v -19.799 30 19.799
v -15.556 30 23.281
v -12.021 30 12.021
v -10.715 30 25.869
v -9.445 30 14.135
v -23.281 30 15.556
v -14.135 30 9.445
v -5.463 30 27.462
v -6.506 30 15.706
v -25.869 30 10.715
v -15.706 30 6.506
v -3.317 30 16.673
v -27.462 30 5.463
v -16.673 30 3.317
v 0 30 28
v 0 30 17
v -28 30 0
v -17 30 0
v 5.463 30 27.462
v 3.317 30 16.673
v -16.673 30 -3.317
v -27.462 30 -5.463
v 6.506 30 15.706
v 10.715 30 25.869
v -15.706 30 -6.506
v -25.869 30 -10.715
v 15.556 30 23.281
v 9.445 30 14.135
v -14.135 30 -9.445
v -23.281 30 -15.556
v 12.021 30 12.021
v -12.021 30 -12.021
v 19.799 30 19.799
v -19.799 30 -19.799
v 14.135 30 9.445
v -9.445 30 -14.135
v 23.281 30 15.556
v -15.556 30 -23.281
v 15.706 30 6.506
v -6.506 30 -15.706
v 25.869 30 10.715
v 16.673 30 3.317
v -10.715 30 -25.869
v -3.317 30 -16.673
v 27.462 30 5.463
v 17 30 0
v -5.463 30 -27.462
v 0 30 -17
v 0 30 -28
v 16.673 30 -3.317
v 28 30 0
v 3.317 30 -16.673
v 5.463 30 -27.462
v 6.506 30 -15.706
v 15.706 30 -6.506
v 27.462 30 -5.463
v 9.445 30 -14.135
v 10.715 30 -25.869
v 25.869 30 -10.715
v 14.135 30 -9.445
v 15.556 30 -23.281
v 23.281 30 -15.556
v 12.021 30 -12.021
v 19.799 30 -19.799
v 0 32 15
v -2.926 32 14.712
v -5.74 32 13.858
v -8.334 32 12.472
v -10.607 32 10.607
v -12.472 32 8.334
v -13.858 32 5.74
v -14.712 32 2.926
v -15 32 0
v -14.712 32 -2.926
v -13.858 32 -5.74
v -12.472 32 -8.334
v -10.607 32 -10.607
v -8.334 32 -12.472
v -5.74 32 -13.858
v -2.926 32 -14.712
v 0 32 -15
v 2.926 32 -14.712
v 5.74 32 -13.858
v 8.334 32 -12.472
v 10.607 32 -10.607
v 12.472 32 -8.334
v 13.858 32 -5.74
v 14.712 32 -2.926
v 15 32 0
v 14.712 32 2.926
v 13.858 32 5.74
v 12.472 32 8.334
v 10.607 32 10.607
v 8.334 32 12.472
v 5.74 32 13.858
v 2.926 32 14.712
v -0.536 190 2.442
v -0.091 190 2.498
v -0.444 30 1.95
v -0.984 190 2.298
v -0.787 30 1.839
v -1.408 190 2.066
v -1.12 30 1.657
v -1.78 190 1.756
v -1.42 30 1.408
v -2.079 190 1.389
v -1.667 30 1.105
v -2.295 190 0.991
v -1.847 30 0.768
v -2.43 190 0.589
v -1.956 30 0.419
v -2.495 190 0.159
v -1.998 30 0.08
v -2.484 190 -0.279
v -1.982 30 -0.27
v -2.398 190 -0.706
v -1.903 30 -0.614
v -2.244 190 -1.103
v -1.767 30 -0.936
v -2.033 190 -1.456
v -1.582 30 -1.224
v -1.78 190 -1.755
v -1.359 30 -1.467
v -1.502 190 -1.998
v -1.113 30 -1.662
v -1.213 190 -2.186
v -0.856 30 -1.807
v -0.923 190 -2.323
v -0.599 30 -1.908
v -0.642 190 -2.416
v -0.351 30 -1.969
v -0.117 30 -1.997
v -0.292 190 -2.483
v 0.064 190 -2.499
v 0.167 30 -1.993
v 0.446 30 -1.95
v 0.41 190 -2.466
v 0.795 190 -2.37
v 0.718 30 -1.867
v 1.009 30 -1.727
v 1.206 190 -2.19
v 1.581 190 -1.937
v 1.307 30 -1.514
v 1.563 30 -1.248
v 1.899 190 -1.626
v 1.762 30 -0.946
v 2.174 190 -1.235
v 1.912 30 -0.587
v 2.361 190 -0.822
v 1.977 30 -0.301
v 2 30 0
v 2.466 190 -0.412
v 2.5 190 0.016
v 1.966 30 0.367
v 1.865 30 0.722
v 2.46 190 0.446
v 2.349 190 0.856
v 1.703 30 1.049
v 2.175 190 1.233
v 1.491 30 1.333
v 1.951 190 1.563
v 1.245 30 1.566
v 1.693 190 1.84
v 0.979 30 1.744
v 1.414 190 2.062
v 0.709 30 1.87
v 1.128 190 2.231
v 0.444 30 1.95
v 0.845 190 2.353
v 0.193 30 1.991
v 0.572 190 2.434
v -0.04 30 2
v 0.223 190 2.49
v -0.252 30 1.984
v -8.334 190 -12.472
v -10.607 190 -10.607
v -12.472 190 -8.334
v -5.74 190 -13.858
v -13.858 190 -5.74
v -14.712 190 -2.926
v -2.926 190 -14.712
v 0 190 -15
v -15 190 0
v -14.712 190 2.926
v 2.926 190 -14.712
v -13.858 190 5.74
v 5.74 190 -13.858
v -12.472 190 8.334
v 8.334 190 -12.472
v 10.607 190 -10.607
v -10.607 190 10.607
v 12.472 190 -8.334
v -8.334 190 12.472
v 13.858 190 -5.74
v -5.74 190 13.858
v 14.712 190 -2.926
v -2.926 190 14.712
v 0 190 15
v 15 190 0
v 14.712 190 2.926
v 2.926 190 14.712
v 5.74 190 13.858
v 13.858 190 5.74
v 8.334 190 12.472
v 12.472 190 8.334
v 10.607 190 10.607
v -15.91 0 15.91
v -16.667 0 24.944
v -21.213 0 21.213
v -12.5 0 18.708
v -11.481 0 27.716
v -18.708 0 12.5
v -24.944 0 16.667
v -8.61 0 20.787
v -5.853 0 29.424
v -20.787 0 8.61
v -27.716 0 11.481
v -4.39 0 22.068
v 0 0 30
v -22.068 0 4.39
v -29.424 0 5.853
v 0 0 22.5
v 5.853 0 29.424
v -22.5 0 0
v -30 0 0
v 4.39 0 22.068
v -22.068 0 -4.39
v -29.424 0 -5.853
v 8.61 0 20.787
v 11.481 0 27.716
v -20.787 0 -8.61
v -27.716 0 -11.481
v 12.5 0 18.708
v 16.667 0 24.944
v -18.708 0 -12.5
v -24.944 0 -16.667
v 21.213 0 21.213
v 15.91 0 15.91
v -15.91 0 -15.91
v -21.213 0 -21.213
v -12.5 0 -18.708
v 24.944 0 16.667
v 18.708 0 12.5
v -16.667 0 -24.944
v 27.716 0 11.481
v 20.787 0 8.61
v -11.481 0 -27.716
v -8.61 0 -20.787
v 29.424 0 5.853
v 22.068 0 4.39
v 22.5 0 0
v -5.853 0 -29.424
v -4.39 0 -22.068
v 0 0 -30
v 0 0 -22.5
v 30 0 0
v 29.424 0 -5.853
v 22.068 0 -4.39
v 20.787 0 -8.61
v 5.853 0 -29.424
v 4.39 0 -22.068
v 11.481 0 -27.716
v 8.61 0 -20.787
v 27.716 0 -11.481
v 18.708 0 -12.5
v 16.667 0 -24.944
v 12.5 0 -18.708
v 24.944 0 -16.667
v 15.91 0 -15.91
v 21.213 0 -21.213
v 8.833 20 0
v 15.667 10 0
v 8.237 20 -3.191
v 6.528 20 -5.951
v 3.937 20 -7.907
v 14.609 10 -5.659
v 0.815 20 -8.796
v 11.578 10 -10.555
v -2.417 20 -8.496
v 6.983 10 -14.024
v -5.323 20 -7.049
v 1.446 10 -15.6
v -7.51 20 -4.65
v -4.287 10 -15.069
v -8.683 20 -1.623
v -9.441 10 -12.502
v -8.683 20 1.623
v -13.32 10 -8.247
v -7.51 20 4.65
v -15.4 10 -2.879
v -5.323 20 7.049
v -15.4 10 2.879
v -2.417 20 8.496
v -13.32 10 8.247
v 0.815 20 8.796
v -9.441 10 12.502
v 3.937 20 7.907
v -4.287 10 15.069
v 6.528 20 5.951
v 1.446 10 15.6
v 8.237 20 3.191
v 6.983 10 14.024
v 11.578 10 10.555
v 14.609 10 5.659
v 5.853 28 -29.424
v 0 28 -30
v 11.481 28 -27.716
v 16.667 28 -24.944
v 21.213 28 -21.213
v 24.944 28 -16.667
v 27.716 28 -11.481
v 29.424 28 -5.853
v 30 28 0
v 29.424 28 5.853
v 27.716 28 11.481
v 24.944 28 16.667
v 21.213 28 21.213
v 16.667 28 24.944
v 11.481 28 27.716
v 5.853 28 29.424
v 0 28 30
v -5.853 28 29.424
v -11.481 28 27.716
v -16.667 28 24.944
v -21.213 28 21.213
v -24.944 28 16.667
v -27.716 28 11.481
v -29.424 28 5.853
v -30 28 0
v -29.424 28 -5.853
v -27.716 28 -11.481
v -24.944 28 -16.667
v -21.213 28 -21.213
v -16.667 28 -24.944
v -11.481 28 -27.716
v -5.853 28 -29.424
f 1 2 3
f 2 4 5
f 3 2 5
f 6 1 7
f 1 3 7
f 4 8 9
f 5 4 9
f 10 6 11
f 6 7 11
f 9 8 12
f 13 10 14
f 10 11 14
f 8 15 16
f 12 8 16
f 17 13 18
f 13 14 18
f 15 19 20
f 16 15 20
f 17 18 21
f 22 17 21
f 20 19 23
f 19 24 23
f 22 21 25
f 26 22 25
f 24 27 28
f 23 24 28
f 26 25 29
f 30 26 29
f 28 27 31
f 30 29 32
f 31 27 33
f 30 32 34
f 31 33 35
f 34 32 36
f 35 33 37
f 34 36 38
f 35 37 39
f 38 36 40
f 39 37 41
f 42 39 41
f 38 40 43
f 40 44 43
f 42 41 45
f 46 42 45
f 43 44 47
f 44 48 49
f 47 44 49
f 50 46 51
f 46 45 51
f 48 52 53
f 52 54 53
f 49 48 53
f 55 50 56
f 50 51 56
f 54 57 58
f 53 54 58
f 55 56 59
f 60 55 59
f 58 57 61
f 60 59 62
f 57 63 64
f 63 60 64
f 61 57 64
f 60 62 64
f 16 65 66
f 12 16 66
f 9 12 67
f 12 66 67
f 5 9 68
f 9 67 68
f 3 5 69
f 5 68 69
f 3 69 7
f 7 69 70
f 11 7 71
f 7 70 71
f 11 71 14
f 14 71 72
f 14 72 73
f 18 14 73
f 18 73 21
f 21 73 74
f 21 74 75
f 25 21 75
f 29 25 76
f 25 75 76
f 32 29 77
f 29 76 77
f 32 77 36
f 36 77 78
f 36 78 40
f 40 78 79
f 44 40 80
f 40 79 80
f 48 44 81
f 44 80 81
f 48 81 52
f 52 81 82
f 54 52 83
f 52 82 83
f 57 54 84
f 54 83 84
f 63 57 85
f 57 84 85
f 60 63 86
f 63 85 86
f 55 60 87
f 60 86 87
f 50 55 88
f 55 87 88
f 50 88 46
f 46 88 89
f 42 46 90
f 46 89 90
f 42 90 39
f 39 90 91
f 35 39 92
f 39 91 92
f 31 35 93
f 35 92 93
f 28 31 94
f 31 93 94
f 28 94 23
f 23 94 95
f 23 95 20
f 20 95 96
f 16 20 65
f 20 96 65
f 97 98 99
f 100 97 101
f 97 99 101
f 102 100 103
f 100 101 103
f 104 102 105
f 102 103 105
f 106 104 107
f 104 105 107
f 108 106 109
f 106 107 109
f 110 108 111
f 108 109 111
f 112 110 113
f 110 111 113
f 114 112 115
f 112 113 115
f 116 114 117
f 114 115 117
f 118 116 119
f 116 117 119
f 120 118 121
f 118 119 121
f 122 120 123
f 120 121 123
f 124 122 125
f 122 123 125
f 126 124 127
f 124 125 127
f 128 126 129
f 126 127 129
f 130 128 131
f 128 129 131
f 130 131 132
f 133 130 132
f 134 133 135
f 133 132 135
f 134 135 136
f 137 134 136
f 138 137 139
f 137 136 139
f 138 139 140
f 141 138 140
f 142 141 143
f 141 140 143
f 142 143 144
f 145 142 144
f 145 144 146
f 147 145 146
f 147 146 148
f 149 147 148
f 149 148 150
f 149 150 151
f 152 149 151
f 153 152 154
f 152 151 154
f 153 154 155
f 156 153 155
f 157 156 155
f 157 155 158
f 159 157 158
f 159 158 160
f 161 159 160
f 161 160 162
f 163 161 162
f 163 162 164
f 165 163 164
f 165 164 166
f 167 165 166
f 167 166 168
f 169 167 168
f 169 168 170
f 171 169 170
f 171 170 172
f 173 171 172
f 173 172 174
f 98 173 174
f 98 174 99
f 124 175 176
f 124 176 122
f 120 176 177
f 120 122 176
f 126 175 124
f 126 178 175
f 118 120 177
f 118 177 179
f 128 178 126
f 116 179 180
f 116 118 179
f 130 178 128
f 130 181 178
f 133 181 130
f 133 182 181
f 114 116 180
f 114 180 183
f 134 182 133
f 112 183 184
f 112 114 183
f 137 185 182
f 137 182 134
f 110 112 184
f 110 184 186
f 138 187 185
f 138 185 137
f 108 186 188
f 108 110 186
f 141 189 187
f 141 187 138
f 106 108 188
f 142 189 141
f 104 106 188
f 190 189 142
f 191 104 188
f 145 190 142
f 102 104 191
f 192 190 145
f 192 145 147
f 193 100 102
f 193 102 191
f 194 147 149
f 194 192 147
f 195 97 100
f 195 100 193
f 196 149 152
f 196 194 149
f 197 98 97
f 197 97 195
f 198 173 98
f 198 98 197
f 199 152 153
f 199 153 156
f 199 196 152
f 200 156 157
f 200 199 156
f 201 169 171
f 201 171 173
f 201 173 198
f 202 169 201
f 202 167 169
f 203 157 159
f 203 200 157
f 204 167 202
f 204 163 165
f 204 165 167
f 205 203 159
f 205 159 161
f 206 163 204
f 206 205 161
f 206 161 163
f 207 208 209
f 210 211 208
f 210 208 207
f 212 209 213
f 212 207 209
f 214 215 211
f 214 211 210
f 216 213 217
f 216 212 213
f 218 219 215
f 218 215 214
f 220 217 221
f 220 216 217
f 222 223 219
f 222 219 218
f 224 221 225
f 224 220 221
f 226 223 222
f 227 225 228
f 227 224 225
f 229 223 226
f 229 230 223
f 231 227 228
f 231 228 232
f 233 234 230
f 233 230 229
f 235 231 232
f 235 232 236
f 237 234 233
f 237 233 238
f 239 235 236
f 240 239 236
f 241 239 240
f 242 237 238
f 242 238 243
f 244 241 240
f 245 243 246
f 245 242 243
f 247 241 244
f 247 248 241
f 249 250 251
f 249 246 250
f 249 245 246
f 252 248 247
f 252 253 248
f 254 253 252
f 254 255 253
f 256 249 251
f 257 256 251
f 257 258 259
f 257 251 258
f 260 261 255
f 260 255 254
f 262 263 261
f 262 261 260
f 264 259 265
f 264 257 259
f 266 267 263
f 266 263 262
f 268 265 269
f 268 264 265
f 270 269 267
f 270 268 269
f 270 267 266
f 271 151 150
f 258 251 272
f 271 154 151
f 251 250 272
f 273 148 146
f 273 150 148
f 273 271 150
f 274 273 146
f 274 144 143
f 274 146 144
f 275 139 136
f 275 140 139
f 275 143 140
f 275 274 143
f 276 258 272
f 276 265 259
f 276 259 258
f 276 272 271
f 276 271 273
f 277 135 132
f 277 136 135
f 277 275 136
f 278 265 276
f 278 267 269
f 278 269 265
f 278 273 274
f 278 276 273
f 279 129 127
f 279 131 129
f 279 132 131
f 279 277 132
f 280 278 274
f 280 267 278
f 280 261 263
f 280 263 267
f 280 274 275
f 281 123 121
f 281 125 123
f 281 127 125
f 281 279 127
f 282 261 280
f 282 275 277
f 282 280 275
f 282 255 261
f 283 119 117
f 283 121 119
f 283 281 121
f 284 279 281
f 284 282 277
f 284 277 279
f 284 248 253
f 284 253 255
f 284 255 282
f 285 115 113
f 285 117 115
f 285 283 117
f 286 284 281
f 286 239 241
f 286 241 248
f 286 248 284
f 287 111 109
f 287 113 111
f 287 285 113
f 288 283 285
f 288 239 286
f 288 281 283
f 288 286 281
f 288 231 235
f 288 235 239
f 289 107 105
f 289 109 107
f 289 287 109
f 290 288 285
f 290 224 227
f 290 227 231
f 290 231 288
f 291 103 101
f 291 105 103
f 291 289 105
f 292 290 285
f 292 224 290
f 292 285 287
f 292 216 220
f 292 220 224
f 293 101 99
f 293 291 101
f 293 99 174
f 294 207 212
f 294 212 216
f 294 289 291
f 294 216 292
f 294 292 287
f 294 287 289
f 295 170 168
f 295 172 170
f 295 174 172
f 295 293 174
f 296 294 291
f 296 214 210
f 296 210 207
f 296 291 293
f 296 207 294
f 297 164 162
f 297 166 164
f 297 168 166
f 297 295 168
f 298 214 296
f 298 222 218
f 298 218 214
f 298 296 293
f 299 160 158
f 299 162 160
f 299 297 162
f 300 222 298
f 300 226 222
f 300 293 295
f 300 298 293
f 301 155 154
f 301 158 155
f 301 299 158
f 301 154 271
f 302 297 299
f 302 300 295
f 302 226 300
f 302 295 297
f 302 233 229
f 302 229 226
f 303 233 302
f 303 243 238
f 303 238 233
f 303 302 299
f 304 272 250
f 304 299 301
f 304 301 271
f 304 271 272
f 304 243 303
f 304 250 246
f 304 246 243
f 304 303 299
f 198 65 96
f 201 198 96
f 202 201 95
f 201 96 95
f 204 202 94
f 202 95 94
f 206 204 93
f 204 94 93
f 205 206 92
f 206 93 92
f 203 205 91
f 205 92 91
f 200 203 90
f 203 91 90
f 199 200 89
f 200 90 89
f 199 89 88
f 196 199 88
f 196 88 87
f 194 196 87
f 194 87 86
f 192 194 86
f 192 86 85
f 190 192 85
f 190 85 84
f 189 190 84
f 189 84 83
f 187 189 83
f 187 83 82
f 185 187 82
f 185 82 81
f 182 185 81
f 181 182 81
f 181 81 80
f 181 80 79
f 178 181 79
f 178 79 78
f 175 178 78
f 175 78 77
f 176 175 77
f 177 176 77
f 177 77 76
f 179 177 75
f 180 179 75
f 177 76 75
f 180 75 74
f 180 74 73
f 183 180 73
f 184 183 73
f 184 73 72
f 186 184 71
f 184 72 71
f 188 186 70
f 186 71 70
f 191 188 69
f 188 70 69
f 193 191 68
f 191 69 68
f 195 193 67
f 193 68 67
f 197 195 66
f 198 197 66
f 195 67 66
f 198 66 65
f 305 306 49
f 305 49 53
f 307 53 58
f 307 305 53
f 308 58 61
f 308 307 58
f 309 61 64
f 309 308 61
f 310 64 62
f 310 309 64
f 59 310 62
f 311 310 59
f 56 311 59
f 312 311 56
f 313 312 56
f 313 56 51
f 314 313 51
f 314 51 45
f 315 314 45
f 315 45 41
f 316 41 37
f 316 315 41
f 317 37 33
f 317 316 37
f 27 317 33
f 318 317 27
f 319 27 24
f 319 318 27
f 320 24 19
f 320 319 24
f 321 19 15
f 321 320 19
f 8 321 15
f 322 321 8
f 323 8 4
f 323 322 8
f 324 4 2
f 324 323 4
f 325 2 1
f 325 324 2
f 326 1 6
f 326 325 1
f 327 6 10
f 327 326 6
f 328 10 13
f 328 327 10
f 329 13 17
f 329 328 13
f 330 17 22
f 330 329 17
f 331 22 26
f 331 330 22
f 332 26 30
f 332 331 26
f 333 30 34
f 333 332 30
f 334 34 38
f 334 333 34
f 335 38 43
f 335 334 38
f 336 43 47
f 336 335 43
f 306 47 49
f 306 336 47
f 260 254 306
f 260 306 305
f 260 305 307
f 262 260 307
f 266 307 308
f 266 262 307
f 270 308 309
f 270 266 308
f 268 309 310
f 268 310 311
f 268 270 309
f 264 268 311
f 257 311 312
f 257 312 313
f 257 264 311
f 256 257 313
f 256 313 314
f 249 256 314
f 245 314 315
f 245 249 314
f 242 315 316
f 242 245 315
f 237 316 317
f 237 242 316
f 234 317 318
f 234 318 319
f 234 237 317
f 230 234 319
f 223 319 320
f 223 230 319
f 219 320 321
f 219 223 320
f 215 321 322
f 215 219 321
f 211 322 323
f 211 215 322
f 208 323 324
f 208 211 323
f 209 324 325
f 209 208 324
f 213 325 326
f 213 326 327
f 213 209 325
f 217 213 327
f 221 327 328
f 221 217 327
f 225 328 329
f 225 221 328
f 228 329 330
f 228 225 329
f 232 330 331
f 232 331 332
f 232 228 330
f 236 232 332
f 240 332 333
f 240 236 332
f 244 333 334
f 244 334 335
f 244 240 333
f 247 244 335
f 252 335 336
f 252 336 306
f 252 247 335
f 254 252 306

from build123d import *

# Parameters (mm, degrees)
SKETCH2_R           = 15
BOSS_EXTRUDE1_DEPTH = 190
SKETCH3_R           = 30
BOSS_EXTRUDE2_DEPTH = 30
CHAMFER1_SIZE       = 2
CHAMFER2_SIZE       = 2
SKETCH10_R          = 2
SKETCH11_R          = 22.5


with BuildPart() as part:
    # Sketch2 → Boss-Extrude1 (new body)
    with BuildSketch(Plane(origin=(0, 0, 0), x_dir=(1, 0, 0), z_dir=(0, 1, 0))):
        with Locations(Location((0, 0, 0), (0, 0, 270))):
            Circle(SKETCH2_R)
    extrude(amount=BOSS_EXTRUDE1_DEPTH)

    # Sketch3 → Boss-Extrude2 (add)
    with BuildSketch(Plane.XZ):
        with Locations(Location((0, 0, 0), (0, 0, 270))):
            Circle(SKETCH3_R)
    extrude(amount=-BOSS_EXTRUDE2_DEPTH)

    # Chamfer1
    chamfer1_edges = [part.edges().sort_by_distance(p)[0] for p in [
        (0, 30, -15),
    ]]
    chamfer(chamfer1_edges, length=CHAMFER1_SIZE)

    # Chamfer2
    chamfer2_edges = [part.edges().sort_by_distance(p)[0] for p in [
        (0, 30, 30),
    ]]
    chamfer(chamfer2_edges, length=CHAMFER2_SIZE)

    # Cut-Loft1: read off the stored shape, not the designer's step
    # Cut-Loft1: loft between two sections, ruled curve by curve
    cut_loft1_from = [
        Edge.make_bspline([(-0.091086023, 190, 2.498340116), (-5.087766255, 190, 2.316168071), (-4.90559421, 190, -2.680512162), (0.091086023, 190, -2.498340116), (5.087766255, 190, -2.316168071), (4.90559421, 190, 2.680512162), (-0.091086023, 190, 2.498340116)], [0, 0, 0, 0, 0.5, 0.5, 0.5, 1, 1, 1, 1], 3, [1, 0.333333333, 0.333333333, 1, 0.333333333, 0.333333333, 1]),
    ]
    cut_loft1_to = [
        Edge.make_bspline([(-0.443641604, 30, 1.950174897), (-4.343991397, 30, 1.062891688), (-3.456708189, 30, -2.837458105), (0.443641604, 30, -1.950174897), (4.343991397, 30, -1.062891688), (3.456708189, 30, 2.837458105), (-0.443641604, 30, 1.950174897)], [0, 0, 0, 0, 0.5, 0.5, 0.5, 1, 1, 1, 1], 3, [1, 0.333333333, 0.333333333, 1, 0.333333333, 0.333333333, 1]),
    ]
    cut_loft1 = Solid(Shell([*[Face.make_surface_from_curves(cut_loft1_from[k], cut_loft1_to[k]) for k in range(1)], Face(Wire(cut_loft1_from)), Face(Wire(cut_loft1_to))]))
    add(cut_loft1, mode=Mode.SUBTRACT)

    # Sketch10 → Cut-Loft3 section 0
    with BuildSketch(Plane(origin=(0, 30, 0), x_dir=(1, 0, 0), z_dir=(0, 1, 0))):
        Circle(SKETCH10_R)
    # Sketch11 → Cut-Loft3 section 1
    with BuildSketch(Plane.XZ):
        Circle(SKETCH11_R)
    loft(mode=Mode.SUBTRACT)


solid = part.part
